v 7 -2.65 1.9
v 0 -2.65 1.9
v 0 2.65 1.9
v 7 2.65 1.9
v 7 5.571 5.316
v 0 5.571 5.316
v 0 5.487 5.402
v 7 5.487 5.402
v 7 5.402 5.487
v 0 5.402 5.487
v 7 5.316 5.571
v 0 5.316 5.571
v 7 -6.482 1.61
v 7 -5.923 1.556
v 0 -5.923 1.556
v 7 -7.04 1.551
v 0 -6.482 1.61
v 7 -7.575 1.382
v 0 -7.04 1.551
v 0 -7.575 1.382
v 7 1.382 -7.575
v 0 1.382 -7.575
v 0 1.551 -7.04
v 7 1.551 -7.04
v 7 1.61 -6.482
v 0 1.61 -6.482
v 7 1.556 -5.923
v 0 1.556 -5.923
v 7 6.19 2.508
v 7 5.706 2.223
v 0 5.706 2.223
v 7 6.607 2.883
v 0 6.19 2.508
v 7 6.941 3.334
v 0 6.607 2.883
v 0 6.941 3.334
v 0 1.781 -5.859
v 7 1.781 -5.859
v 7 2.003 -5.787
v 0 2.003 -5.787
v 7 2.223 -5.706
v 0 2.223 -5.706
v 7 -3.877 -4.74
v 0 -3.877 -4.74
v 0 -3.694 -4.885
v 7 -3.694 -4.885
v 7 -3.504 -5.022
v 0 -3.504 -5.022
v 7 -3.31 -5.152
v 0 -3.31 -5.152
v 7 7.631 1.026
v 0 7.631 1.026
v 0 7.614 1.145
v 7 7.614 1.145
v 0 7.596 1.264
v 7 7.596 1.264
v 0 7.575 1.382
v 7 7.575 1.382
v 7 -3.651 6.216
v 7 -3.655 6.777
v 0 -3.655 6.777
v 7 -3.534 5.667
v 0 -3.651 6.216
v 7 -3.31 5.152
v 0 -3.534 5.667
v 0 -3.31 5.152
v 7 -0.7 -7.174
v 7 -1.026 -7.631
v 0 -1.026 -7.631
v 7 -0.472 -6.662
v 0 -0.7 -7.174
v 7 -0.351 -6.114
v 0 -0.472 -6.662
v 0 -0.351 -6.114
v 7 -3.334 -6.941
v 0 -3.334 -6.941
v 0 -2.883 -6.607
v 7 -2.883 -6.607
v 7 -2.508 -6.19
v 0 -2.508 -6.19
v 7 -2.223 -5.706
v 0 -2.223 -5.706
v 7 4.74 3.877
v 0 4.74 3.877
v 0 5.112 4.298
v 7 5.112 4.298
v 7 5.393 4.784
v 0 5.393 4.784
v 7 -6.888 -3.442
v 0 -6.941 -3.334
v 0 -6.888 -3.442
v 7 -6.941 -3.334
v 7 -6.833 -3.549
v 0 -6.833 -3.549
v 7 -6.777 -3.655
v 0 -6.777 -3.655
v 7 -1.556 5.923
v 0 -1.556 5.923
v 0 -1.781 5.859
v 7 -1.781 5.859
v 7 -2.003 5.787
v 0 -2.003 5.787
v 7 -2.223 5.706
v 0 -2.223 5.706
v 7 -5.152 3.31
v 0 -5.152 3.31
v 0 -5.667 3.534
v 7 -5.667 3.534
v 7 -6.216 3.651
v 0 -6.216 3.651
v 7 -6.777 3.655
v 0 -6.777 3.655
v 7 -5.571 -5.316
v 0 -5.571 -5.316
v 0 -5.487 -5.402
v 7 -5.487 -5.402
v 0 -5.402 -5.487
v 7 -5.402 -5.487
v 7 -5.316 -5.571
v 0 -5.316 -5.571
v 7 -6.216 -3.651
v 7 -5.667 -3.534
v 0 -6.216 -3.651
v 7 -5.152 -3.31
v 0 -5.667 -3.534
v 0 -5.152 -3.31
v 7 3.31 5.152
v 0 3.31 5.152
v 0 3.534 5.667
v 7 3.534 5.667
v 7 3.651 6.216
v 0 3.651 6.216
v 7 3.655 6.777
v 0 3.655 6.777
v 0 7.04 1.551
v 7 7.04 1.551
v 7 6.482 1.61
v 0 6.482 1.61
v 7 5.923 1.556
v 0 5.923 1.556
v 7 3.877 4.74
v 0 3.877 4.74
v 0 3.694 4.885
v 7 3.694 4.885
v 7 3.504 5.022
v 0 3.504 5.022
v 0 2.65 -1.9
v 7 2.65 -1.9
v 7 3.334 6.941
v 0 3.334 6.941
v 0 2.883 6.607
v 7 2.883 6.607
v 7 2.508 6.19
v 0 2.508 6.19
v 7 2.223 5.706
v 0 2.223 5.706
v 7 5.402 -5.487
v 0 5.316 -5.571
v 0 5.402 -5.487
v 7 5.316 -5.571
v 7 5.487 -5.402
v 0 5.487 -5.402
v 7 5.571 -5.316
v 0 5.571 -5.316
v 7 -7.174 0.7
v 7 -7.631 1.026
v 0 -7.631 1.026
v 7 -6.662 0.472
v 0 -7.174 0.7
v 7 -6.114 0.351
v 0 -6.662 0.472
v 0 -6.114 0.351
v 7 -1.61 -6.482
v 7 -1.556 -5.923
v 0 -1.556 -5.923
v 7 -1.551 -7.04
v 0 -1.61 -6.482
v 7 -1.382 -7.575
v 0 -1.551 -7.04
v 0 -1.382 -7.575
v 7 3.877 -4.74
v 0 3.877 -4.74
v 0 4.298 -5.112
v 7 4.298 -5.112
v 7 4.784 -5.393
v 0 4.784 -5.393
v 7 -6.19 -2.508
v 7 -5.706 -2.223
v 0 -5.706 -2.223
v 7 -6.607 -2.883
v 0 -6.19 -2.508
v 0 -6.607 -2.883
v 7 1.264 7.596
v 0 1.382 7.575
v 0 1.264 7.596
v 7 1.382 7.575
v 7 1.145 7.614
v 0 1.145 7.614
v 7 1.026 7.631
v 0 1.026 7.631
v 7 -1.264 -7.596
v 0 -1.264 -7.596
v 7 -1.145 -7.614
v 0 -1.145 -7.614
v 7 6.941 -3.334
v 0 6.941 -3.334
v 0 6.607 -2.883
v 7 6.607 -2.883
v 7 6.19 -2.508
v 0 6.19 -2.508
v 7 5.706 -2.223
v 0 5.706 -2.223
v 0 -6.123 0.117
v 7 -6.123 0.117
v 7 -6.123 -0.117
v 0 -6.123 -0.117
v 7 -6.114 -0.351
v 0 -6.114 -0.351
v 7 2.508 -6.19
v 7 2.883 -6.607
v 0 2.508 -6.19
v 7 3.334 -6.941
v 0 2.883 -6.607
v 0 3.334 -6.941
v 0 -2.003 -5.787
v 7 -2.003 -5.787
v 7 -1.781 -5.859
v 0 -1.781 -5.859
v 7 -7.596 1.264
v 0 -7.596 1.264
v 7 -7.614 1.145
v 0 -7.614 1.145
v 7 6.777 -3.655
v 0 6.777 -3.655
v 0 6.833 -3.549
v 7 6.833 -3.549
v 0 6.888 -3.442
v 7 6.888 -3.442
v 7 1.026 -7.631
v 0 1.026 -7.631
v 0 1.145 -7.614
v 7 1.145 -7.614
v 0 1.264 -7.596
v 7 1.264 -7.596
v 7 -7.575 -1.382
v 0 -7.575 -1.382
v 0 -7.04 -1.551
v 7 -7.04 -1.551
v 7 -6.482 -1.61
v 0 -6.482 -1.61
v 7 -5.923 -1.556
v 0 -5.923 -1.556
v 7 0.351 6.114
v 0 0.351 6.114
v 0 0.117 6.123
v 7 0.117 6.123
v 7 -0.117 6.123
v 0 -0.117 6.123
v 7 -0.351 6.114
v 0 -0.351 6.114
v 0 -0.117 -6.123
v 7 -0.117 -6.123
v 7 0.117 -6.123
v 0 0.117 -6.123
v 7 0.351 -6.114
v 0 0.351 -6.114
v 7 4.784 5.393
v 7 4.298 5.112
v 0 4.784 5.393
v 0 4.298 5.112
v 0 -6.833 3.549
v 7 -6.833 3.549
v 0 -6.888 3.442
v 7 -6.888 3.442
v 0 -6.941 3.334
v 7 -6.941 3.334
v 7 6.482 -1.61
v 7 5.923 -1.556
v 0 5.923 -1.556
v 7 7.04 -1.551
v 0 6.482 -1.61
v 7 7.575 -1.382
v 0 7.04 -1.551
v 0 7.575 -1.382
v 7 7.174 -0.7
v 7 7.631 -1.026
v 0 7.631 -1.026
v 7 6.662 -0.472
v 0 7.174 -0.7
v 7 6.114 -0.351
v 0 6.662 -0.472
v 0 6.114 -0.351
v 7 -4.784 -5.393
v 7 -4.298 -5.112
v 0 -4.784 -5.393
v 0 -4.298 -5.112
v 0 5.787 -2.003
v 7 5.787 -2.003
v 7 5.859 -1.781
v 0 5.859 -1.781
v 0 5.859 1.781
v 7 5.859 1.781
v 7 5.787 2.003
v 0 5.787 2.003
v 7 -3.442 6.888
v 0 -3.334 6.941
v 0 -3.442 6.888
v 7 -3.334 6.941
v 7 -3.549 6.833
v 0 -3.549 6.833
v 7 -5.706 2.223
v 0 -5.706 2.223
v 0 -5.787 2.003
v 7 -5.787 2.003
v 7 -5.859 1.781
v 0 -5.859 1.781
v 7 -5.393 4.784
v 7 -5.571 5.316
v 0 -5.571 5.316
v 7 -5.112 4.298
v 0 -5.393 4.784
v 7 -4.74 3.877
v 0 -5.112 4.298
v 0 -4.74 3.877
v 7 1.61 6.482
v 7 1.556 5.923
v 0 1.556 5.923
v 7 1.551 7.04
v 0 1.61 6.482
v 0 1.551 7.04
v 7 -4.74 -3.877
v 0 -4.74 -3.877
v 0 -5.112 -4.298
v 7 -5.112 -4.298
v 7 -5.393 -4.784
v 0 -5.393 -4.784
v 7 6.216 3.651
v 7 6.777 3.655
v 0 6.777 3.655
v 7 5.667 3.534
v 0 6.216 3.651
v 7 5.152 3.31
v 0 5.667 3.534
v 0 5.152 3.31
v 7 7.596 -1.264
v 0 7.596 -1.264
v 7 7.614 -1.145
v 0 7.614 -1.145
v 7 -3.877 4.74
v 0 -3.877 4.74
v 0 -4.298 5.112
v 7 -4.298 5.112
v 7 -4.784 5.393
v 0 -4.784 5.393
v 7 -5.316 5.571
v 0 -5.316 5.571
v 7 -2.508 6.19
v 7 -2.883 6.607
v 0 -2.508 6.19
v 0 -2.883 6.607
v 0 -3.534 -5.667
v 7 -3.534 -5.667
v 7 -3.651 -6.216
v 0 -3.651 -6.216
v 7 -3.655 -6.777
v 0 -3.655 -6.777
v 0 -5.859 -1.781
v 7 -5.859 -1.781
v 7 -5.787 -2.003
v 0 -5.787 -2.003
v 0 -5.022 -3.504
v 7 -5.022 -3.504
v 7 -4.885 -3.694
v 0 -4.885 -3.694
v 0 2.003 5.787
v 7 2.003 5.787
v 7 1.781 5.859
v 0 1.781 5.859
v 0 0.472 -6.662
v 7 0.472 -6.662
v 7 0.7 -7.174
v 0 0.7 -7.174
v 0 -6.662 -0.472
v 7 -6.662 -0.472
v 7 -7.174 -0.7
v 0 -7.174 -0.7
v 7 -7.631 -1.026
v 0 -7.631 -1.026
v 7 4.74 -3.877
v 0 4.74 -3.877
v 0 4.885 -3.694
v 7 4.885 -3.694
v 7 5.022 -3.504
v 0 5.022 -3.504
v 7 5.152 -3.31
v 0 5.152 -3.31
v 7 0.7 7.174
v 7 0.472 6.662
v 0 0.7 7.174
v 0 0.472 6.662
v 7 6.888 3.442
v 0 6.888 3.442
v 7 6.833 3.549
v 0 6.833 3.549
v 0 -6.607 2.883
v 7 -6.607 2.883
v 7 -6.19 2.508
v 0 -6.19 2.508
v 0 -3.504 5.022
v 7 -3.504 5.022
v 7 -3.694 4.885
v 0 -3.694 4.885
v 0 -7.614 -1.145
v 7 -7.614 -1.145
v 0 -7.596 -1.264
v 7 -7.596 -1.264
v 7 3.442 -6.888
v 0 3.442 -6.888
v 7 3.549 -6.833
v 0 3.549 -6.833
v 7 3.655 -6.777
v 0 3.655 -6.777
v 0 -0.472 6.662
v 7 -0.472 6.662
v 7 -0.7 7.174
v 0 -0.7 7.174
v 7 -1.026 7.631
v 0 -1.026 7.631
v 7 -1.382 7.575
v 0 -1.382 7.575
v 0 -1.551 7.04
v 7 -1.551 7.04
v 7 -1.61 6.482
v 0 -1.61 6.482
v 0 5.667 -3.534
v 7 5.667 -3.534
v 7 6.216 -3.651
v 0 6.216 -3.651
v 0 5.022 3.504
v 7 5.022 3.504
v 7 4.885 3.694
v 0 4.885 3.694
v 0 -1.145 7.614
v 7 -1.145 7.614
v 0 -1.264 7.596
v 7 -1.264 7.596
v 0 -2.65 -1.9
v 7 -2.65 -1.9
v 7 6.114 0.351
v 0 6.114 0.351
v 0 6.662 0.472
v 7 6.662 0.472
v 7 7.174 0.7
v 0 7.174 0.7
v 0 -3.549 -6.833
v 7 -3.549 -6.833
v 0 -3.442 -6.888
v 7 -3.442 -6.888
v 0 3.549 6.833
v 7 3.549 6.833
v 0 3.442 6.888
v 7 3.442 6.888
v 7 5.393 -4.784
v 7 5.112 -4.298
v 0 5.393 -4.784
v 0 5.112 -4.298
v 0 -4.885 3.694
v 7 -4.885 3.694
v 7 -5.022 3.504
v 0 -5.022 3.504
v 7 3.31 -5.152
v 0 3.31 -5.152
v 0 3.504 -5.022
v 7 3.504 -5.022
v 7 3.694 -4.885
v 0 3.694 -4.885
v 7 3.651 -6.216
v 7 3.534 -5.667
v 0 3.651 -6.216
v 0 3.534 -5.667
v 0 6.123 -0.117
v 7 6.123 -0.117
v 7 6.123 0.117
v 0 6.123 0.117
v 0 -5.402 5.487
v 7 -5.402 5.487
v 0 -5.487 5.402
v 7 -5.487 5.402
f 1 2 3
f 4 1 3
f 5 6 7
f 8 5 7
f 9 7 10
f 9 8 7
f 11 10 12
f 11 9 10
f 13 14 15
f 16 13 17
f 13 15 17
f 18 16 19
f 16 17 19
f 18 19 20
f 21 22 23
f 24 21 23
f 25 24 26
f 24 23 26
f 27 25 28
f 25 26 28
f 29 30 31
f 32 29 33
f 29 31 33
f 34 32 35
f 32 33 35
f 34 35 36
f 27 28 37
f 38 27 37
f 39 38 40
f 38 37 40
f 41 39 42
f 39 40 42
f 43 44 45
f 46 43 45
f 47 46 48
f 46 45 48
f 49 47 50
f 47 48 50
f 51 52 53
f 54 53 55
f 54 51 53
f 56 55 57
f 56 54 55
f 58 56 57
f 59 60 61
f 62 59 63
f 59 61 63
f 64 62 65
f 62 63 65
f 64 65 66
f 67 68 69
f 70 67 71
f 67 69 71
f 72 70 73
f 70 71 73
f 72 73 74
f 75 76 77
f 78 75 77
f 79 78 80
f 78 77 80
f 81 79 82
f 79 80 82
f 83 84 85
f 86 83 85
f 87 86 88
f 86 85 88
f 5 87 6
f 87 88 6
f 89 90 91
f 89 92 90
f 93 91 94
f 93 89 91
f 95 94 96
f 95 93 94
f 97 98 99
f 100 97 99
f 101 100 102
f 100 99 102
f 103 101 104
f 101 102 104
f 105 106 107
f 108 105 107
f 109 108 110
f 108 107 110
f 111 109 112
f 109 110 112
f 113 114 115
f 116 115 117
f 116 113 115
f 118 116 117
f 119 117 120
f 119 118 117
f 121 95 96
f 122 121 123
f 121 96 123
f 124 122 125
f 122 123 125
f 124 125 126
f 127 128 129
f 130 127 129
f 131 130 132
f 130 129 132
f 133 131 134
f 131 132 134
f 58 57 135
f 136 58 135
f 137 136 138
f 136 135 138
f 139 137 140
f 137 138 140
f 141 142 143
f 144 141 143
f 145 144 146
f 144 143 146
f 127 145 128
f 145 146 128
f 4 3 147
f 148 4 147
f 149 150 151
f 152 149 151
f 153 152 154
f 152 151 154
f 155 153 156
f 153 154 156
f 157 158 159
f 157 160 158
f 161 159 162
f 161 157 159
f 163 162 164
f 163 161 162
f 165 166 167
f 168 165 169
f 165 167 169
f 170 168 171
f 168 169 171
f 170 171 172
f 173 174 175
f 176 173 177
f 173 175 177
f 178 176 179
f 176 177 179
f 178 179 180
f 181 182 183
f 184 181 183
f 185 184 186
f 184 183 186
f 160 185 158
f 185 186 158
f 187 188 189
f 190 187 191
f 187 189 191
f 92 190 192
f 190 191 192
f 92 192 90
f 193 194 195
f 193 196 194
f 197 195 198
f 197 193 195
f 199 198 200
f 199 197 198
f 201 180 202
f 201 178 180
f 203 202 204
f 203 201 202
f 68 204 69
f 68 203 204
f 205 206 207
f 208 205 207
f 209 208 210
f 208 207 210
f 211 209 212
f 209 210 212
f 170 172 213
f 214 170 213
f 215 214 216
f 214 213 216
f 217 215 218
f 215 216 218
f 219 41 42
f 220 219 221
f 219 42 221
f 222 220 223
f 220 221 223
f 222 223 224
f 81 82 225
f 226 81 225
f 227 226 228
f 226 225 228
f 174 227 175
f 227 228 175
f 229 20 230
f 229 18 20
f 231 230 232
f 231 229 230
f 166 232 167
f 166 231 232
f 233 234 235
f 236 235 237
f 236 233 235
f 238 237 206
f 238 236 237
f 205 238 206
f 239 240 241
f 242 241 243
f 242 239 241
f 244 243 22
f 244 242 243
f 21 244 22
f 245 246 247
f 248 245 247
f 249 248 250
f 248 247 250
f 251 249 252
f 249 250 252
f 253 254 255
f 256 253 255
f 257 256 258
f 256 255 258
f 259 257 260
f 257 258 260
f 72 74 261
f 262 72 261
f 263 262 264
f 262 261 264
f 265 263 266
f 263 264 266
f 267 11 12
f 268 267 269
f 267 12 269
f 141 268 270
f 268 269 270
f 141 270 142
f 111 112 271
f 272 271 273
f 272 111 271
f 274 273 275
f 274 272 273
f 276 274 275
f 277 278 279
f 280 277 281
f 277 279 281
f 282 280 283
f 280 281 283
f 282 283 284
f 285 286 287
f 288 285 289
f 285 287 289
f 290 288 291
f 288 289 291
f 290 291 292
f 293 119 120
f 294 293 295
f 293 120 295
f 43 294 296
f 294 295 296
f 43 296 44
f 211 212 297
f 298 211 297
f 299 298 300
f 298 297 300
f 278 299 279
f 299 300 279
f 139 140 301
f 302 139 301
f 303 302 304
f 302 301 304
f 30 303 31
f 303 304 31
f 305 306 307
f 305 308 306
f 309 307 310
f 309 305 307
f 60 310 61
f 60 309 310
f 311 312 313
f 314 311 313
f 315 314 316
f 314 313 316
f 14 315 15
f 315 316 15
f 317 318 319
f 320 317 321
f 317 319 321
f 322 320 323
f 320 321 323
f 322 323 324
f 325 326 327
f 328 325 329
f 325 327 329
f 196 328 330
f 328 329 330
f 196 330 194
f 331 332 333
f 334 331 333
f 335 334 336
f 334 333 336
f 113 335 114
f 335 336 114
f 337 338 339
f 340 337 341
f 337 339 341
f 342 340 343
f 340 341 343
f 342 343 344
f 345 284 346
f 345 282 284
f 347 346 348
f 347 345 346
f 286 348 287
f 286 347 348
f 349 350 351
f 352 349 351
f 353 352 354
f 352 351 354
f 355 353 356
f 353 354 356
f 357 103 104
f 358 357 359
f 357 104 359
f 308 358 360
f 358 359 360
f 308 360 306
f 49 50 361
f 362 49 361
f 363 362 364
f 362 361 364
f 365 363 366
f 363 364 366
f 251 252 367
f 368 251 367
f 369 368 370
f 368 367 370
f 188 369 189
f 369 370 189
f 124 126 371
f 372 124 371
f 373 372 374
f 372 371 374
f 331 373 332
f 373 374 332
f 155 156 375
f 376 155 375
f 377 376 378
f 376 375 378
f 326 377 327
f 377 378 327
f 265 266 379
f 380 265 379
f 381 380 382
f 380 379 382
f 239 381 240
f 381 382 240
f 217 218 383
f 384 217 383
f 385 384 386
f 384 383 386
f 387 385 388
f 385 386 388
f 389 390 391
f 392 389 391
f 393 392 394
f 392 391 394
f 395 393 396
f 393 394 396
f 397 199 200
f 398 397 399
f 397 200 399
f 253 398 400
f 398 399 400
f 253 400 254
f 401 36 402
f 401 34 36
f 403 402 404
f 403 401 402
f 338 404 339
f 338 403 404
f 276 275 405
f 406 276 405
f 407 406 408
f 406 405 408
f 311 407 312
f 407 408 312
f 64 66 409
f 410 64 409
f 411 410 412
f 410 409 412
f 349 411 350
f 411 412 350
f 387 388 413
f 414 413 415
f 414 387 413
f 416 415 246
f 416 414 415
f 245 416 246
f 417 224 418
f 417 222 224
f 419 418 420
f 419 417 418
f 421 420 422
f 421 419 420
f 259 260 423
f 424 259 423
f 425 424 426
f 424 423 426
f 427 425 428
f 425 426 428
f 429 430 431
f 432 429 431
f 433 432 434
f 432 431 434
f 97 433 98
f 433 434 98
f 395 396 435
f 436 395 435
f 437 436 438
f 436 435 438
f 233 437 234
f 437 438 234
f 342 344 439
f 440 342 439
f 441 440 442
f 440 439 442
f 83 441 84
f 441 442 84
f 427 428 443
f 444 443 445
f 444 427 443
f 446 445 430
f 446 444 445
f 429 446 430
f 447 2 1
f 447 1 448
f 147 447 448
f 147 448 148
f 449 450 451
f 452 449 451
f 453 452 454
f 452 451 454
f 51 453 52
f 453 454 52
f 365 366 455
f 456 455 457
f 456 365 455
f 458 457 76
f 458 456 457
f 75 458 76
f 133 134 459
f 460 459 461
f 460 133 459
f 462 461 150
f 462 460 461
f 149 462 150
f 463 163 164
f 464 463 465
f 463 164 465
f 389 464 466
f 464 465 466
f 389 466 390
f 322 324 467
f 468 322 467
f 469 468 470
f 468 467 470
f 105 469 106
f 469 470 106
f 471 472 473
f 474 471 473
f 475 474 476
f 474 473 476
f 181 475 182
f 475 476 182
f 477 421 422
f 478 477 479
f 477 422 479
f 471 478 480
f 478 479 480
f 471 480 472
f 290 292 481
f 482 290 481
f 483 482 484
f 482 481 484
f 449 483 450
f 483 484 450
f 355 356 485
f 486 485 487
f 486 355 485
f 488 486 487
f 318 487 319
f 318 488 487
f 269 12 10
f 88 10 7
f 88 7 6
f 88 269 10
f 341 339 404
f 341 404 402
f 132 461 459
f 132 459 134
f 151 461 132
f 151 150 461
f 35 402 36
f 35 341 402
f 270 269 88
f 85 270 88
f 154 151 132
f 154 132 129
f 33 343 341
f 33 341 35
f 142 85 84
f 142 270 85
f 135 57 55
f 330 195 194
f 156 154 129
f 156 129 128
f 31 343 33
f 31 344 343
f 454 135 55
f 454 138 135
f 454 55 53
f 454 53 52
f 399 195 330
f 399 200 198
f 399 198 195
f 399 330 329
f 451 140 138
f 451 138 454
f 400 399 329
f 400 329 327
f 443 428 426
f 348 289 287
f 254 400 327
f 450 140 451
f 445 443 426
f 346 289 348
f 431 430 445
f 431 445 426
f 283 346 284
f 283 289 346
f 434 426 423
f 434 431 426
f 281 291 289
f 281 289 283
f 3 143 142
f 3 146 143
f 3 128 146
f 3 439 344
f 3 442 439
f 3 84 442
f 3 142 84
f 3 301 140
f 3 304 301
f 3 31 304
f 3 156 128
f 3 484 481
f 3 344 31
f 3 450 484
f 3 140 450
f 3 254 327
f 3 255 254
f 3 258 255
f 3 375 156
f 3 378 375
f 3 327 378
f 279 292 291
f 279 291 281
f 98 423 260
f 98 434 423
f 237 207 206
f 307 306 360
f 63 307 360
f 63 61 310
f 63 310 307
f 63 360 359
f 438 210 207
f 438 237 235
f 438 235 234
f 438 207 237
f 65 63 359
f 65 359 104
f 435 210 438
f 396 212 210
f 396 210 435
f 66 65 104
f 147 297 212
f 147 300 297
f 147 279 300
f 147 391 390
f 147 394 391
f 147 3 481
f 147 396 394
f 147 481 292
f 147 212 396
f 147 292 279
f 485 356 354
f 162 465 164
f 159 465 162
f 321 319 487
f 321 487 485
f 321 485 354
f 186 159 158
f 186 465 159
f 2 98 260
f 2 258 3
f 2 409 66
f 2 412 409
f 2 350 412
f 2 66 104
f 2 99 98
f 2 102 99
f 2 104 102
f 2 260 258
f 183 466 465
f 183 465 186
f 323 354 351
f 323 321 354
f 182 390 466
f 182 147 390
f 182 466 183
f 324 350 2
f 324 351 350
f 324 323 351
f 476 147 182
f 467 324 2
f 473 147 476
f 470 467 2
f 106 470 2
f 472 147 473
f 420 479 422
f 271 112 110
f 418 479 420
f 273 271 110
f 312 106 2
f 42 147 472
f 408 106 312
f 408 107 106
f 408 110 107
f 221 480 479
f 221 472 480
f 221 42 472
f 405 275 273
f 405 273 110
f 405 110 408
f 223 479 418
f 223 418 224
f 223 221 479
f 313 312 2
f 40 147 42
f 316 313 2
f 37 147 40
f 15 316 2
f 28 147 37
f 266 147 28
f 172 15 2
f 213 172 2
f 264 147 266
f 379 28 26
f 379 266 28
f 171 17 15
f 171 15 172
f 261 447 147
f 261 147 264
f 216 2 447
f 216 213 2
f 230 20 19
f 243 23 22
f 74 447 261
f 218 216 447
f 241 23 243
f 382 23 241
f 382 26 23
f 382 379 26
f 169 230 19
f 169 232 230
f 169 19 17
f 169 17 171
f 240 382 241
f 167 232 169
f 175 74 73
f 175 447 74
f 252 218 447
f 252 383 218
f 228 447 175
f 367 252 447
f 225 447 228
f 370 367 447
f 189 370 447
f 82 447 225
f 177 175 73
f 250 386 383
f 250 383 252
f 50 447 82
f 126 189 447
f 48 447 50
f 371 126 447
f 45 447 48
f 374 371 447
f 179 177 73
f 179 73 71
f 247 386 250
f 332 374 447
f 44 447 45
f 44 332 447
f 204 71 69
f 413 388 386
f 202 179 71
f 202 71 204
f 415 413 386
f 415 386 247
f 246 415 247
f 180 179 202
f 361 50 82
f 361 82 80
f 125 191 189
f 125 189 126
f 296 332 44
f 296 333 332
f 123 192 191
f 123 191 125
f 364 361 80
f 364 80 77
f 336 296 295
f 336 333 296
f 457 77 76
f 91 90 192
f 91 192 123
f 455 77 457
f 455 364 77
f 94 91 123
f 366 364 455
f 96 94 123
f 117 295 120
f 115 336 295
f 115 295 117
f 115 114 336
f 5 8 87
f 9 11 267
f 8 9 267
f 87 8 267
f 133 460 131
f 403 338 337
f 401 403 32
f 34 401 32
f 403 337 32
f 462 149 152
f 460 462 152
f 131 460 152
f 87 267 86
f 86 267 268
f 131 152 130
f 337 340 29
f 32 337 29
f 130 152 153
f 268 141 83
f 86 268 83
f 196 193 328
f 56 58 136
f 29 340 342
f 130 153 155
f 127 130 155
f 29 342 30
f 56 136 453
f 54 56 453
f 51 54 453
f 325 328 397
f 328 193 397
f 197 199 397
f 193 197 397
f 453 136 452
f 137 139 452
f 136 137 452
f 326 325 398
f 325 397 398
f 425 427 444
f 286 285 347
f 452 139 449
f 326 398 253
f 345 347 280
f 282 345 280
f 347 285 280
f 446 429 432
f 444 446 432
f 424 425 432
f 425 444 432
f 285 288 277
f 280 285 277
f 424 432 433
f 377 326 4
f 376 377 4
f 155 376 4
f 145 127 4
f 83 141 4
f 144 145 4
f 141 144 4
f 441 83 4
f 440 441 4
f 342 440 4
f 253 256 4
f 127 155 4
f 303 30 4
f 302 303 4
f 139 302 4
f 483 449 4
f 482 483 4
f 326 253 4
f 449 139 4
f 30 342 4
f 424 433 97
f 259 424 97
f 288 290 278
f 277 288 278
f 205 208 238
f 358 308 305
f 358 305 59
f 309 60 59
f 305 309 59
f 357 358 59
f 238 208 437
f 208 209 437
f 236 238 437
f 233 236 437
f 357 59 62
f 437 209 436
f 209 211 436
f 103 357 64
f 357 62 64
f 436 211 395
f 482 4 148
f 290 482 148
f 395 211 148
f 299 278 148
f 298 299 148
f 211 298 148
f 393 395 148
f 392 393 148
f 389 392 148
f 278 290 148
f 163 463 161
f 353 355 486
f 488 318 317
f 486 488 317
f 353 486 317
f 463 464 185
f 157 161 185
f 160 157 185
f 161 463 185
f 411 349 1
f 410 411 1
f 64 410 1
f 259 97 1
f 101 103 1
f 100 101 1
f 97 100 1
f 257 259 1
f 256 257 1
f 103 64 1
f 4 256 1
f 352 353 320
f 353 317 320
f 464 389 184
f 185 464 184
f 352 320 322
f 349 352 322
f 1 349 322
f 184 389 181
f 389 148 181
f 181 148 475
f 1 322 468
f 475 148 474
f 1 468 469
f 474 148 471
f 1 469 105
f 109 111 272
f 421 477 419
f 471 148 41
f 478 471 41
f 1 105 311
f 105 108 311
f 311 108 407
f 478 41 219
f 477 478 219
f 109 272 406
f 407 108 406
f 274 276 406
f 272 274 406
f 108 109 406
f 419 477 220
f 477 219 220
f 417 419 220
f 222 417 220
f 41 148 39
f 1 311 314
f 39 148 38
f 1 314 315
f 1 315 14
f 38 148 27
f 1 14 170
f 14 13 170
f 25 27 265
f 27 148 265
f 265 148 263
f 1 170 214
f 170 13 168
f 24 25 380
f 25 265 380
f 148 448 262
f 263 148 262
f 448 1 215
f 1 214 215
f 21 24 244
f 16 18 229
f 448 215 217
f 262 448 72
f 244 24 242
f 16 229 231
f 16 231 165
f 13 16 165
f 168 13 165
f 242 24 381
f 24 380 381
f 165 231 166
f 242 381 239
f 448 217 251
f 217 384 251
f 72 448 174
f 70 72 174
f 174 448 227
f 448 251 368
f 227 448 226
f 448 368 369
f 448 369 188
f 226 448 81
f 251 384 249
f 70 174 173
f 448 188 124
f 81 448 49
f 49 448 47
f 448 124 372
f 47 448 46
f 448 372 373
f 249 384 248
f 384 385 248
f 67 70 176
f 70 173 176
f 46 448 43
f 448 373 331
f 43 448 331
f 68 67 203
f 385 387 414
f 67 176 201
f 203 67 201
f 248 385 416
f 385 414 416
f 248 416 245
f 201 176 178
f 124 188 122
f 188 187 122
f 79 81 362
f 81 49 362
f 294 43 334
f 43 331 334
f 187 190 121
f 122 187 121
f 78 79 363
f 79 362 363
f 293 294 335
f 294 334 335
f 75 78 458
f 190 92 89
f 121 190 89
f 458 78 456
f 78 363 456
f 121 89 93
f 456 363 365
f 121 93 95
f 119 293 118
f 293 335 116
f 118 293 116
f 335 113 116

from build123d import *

# Parameters (mm, degrees)
BASPROSKE_W             = 7
BASPROSKE_H             = 7.7
TOOTHCUT_DEPTH          = 13.945269406
TEETHCUTS_COUNT         = 20
TEETHCUTS_ANGLE         = 342
BORSKE_R                = 0.5
BORE_DEPTH              = 50.0000508
CUT_EXTRUDE1_DEPTH      = 13.86365753
CUT_EXTRUDE1_DEPTH_BACK = 13.86365753
SKETCH1_W               = 3.8
SKETCH1_H               = 5.3


with BuildPart() as part:
    # BasProSke → Base-Revolve (revolve)
    with BuildSketch(Plane(origin=(0, 0, 0), x_dir=(1, 0, 0), z_dir=(0, 1, 0)), mode=Mode.PRIVATE) as base_revolve_sk:
        with Locations((3.5, 3.85)):
            Rectangle(BASPROSKE_W, BASPROSKE_H)
    revolve(base_revolve_sk.sketch.rotate(Axis((-10, 0, 0), (1, 0, 0)), 180), axis=Axis((-10, 0, 0), (1, 0, 0)))

    # TooCutSke → ToothCut (cut, through all)
    with BuildSketch(Plane(origin=(0, 0, 0), x_dir=(0, 0, -1), z_dir=(1, 0, 0))):
        with BuildLine():
            ThreePointArc((0.350524468, 6.11396014), (0, 6.124), (-0.350524468, 6.11396014))
            ThreePointArc((-0.350524468, 6.11396014), (-0.579534642, 6.937844235), (-1.04652851, 7.654187301))
            ThreePointArc((-1.04652851, 7.654187301), (0, 7.7254), (1.04652851, 7.654187301))
            ThreePointArc((1.04652851, 7.654187301), (0.579534642, 6.937844235), (0.350524468, 6.11396014))
        make_face()
    toothcut = extrude(amount=TOOTHCUT_DEPTH, mode=Mode.SUBTRACT)

    # TeethCuts: ToothCut ×20 about axis
    teethcuts_axis = Axis((-10, 0, 0), (1, 0, 0))
    for i in range(1, TEETHCUTS_COUNT):
        add(toothcut.rotate(teethcuts_axis, i * TEETHCUTS_ANGLE / (TEETHCUTS_COUNT - 1)), mode=Mode.SUBTRACT)

    # BorSke → Bore (cut, symmetric)
    with BuildSketch(Plane(origin=(0, 0, 0), x_dir=(0, 0, -1), z_dir=(1, 0, 0))):
        with Locations(Location((0, 0, 0), (0, 0, 180))):
            Circle(BORSKE_R)
    extrude(amount=BORE_DEPTH, both=True, mode=Mode.SUBTRACT)

    # Sketch1 → Cut-Extrude1 (cut, two sides: drawn at the far end of the back side and taken through both)
    with BuildSketch(Plane(origin=(7, 0, 0), x_dir=(0, 0, -1), z_dir=(1, 0, 0)).offset(-CUT_EXTRUDE1_DEPTH_BACK)):
        Rectangle(SKETCH1_W, SKETCH1_H)
    extrude(amount=CUT_EXTRUDE1_DEPTH + CUT_EXTRUDE1_DEPTH_BACK, mode=Mode.SUBTRACT)


solid = part.part
